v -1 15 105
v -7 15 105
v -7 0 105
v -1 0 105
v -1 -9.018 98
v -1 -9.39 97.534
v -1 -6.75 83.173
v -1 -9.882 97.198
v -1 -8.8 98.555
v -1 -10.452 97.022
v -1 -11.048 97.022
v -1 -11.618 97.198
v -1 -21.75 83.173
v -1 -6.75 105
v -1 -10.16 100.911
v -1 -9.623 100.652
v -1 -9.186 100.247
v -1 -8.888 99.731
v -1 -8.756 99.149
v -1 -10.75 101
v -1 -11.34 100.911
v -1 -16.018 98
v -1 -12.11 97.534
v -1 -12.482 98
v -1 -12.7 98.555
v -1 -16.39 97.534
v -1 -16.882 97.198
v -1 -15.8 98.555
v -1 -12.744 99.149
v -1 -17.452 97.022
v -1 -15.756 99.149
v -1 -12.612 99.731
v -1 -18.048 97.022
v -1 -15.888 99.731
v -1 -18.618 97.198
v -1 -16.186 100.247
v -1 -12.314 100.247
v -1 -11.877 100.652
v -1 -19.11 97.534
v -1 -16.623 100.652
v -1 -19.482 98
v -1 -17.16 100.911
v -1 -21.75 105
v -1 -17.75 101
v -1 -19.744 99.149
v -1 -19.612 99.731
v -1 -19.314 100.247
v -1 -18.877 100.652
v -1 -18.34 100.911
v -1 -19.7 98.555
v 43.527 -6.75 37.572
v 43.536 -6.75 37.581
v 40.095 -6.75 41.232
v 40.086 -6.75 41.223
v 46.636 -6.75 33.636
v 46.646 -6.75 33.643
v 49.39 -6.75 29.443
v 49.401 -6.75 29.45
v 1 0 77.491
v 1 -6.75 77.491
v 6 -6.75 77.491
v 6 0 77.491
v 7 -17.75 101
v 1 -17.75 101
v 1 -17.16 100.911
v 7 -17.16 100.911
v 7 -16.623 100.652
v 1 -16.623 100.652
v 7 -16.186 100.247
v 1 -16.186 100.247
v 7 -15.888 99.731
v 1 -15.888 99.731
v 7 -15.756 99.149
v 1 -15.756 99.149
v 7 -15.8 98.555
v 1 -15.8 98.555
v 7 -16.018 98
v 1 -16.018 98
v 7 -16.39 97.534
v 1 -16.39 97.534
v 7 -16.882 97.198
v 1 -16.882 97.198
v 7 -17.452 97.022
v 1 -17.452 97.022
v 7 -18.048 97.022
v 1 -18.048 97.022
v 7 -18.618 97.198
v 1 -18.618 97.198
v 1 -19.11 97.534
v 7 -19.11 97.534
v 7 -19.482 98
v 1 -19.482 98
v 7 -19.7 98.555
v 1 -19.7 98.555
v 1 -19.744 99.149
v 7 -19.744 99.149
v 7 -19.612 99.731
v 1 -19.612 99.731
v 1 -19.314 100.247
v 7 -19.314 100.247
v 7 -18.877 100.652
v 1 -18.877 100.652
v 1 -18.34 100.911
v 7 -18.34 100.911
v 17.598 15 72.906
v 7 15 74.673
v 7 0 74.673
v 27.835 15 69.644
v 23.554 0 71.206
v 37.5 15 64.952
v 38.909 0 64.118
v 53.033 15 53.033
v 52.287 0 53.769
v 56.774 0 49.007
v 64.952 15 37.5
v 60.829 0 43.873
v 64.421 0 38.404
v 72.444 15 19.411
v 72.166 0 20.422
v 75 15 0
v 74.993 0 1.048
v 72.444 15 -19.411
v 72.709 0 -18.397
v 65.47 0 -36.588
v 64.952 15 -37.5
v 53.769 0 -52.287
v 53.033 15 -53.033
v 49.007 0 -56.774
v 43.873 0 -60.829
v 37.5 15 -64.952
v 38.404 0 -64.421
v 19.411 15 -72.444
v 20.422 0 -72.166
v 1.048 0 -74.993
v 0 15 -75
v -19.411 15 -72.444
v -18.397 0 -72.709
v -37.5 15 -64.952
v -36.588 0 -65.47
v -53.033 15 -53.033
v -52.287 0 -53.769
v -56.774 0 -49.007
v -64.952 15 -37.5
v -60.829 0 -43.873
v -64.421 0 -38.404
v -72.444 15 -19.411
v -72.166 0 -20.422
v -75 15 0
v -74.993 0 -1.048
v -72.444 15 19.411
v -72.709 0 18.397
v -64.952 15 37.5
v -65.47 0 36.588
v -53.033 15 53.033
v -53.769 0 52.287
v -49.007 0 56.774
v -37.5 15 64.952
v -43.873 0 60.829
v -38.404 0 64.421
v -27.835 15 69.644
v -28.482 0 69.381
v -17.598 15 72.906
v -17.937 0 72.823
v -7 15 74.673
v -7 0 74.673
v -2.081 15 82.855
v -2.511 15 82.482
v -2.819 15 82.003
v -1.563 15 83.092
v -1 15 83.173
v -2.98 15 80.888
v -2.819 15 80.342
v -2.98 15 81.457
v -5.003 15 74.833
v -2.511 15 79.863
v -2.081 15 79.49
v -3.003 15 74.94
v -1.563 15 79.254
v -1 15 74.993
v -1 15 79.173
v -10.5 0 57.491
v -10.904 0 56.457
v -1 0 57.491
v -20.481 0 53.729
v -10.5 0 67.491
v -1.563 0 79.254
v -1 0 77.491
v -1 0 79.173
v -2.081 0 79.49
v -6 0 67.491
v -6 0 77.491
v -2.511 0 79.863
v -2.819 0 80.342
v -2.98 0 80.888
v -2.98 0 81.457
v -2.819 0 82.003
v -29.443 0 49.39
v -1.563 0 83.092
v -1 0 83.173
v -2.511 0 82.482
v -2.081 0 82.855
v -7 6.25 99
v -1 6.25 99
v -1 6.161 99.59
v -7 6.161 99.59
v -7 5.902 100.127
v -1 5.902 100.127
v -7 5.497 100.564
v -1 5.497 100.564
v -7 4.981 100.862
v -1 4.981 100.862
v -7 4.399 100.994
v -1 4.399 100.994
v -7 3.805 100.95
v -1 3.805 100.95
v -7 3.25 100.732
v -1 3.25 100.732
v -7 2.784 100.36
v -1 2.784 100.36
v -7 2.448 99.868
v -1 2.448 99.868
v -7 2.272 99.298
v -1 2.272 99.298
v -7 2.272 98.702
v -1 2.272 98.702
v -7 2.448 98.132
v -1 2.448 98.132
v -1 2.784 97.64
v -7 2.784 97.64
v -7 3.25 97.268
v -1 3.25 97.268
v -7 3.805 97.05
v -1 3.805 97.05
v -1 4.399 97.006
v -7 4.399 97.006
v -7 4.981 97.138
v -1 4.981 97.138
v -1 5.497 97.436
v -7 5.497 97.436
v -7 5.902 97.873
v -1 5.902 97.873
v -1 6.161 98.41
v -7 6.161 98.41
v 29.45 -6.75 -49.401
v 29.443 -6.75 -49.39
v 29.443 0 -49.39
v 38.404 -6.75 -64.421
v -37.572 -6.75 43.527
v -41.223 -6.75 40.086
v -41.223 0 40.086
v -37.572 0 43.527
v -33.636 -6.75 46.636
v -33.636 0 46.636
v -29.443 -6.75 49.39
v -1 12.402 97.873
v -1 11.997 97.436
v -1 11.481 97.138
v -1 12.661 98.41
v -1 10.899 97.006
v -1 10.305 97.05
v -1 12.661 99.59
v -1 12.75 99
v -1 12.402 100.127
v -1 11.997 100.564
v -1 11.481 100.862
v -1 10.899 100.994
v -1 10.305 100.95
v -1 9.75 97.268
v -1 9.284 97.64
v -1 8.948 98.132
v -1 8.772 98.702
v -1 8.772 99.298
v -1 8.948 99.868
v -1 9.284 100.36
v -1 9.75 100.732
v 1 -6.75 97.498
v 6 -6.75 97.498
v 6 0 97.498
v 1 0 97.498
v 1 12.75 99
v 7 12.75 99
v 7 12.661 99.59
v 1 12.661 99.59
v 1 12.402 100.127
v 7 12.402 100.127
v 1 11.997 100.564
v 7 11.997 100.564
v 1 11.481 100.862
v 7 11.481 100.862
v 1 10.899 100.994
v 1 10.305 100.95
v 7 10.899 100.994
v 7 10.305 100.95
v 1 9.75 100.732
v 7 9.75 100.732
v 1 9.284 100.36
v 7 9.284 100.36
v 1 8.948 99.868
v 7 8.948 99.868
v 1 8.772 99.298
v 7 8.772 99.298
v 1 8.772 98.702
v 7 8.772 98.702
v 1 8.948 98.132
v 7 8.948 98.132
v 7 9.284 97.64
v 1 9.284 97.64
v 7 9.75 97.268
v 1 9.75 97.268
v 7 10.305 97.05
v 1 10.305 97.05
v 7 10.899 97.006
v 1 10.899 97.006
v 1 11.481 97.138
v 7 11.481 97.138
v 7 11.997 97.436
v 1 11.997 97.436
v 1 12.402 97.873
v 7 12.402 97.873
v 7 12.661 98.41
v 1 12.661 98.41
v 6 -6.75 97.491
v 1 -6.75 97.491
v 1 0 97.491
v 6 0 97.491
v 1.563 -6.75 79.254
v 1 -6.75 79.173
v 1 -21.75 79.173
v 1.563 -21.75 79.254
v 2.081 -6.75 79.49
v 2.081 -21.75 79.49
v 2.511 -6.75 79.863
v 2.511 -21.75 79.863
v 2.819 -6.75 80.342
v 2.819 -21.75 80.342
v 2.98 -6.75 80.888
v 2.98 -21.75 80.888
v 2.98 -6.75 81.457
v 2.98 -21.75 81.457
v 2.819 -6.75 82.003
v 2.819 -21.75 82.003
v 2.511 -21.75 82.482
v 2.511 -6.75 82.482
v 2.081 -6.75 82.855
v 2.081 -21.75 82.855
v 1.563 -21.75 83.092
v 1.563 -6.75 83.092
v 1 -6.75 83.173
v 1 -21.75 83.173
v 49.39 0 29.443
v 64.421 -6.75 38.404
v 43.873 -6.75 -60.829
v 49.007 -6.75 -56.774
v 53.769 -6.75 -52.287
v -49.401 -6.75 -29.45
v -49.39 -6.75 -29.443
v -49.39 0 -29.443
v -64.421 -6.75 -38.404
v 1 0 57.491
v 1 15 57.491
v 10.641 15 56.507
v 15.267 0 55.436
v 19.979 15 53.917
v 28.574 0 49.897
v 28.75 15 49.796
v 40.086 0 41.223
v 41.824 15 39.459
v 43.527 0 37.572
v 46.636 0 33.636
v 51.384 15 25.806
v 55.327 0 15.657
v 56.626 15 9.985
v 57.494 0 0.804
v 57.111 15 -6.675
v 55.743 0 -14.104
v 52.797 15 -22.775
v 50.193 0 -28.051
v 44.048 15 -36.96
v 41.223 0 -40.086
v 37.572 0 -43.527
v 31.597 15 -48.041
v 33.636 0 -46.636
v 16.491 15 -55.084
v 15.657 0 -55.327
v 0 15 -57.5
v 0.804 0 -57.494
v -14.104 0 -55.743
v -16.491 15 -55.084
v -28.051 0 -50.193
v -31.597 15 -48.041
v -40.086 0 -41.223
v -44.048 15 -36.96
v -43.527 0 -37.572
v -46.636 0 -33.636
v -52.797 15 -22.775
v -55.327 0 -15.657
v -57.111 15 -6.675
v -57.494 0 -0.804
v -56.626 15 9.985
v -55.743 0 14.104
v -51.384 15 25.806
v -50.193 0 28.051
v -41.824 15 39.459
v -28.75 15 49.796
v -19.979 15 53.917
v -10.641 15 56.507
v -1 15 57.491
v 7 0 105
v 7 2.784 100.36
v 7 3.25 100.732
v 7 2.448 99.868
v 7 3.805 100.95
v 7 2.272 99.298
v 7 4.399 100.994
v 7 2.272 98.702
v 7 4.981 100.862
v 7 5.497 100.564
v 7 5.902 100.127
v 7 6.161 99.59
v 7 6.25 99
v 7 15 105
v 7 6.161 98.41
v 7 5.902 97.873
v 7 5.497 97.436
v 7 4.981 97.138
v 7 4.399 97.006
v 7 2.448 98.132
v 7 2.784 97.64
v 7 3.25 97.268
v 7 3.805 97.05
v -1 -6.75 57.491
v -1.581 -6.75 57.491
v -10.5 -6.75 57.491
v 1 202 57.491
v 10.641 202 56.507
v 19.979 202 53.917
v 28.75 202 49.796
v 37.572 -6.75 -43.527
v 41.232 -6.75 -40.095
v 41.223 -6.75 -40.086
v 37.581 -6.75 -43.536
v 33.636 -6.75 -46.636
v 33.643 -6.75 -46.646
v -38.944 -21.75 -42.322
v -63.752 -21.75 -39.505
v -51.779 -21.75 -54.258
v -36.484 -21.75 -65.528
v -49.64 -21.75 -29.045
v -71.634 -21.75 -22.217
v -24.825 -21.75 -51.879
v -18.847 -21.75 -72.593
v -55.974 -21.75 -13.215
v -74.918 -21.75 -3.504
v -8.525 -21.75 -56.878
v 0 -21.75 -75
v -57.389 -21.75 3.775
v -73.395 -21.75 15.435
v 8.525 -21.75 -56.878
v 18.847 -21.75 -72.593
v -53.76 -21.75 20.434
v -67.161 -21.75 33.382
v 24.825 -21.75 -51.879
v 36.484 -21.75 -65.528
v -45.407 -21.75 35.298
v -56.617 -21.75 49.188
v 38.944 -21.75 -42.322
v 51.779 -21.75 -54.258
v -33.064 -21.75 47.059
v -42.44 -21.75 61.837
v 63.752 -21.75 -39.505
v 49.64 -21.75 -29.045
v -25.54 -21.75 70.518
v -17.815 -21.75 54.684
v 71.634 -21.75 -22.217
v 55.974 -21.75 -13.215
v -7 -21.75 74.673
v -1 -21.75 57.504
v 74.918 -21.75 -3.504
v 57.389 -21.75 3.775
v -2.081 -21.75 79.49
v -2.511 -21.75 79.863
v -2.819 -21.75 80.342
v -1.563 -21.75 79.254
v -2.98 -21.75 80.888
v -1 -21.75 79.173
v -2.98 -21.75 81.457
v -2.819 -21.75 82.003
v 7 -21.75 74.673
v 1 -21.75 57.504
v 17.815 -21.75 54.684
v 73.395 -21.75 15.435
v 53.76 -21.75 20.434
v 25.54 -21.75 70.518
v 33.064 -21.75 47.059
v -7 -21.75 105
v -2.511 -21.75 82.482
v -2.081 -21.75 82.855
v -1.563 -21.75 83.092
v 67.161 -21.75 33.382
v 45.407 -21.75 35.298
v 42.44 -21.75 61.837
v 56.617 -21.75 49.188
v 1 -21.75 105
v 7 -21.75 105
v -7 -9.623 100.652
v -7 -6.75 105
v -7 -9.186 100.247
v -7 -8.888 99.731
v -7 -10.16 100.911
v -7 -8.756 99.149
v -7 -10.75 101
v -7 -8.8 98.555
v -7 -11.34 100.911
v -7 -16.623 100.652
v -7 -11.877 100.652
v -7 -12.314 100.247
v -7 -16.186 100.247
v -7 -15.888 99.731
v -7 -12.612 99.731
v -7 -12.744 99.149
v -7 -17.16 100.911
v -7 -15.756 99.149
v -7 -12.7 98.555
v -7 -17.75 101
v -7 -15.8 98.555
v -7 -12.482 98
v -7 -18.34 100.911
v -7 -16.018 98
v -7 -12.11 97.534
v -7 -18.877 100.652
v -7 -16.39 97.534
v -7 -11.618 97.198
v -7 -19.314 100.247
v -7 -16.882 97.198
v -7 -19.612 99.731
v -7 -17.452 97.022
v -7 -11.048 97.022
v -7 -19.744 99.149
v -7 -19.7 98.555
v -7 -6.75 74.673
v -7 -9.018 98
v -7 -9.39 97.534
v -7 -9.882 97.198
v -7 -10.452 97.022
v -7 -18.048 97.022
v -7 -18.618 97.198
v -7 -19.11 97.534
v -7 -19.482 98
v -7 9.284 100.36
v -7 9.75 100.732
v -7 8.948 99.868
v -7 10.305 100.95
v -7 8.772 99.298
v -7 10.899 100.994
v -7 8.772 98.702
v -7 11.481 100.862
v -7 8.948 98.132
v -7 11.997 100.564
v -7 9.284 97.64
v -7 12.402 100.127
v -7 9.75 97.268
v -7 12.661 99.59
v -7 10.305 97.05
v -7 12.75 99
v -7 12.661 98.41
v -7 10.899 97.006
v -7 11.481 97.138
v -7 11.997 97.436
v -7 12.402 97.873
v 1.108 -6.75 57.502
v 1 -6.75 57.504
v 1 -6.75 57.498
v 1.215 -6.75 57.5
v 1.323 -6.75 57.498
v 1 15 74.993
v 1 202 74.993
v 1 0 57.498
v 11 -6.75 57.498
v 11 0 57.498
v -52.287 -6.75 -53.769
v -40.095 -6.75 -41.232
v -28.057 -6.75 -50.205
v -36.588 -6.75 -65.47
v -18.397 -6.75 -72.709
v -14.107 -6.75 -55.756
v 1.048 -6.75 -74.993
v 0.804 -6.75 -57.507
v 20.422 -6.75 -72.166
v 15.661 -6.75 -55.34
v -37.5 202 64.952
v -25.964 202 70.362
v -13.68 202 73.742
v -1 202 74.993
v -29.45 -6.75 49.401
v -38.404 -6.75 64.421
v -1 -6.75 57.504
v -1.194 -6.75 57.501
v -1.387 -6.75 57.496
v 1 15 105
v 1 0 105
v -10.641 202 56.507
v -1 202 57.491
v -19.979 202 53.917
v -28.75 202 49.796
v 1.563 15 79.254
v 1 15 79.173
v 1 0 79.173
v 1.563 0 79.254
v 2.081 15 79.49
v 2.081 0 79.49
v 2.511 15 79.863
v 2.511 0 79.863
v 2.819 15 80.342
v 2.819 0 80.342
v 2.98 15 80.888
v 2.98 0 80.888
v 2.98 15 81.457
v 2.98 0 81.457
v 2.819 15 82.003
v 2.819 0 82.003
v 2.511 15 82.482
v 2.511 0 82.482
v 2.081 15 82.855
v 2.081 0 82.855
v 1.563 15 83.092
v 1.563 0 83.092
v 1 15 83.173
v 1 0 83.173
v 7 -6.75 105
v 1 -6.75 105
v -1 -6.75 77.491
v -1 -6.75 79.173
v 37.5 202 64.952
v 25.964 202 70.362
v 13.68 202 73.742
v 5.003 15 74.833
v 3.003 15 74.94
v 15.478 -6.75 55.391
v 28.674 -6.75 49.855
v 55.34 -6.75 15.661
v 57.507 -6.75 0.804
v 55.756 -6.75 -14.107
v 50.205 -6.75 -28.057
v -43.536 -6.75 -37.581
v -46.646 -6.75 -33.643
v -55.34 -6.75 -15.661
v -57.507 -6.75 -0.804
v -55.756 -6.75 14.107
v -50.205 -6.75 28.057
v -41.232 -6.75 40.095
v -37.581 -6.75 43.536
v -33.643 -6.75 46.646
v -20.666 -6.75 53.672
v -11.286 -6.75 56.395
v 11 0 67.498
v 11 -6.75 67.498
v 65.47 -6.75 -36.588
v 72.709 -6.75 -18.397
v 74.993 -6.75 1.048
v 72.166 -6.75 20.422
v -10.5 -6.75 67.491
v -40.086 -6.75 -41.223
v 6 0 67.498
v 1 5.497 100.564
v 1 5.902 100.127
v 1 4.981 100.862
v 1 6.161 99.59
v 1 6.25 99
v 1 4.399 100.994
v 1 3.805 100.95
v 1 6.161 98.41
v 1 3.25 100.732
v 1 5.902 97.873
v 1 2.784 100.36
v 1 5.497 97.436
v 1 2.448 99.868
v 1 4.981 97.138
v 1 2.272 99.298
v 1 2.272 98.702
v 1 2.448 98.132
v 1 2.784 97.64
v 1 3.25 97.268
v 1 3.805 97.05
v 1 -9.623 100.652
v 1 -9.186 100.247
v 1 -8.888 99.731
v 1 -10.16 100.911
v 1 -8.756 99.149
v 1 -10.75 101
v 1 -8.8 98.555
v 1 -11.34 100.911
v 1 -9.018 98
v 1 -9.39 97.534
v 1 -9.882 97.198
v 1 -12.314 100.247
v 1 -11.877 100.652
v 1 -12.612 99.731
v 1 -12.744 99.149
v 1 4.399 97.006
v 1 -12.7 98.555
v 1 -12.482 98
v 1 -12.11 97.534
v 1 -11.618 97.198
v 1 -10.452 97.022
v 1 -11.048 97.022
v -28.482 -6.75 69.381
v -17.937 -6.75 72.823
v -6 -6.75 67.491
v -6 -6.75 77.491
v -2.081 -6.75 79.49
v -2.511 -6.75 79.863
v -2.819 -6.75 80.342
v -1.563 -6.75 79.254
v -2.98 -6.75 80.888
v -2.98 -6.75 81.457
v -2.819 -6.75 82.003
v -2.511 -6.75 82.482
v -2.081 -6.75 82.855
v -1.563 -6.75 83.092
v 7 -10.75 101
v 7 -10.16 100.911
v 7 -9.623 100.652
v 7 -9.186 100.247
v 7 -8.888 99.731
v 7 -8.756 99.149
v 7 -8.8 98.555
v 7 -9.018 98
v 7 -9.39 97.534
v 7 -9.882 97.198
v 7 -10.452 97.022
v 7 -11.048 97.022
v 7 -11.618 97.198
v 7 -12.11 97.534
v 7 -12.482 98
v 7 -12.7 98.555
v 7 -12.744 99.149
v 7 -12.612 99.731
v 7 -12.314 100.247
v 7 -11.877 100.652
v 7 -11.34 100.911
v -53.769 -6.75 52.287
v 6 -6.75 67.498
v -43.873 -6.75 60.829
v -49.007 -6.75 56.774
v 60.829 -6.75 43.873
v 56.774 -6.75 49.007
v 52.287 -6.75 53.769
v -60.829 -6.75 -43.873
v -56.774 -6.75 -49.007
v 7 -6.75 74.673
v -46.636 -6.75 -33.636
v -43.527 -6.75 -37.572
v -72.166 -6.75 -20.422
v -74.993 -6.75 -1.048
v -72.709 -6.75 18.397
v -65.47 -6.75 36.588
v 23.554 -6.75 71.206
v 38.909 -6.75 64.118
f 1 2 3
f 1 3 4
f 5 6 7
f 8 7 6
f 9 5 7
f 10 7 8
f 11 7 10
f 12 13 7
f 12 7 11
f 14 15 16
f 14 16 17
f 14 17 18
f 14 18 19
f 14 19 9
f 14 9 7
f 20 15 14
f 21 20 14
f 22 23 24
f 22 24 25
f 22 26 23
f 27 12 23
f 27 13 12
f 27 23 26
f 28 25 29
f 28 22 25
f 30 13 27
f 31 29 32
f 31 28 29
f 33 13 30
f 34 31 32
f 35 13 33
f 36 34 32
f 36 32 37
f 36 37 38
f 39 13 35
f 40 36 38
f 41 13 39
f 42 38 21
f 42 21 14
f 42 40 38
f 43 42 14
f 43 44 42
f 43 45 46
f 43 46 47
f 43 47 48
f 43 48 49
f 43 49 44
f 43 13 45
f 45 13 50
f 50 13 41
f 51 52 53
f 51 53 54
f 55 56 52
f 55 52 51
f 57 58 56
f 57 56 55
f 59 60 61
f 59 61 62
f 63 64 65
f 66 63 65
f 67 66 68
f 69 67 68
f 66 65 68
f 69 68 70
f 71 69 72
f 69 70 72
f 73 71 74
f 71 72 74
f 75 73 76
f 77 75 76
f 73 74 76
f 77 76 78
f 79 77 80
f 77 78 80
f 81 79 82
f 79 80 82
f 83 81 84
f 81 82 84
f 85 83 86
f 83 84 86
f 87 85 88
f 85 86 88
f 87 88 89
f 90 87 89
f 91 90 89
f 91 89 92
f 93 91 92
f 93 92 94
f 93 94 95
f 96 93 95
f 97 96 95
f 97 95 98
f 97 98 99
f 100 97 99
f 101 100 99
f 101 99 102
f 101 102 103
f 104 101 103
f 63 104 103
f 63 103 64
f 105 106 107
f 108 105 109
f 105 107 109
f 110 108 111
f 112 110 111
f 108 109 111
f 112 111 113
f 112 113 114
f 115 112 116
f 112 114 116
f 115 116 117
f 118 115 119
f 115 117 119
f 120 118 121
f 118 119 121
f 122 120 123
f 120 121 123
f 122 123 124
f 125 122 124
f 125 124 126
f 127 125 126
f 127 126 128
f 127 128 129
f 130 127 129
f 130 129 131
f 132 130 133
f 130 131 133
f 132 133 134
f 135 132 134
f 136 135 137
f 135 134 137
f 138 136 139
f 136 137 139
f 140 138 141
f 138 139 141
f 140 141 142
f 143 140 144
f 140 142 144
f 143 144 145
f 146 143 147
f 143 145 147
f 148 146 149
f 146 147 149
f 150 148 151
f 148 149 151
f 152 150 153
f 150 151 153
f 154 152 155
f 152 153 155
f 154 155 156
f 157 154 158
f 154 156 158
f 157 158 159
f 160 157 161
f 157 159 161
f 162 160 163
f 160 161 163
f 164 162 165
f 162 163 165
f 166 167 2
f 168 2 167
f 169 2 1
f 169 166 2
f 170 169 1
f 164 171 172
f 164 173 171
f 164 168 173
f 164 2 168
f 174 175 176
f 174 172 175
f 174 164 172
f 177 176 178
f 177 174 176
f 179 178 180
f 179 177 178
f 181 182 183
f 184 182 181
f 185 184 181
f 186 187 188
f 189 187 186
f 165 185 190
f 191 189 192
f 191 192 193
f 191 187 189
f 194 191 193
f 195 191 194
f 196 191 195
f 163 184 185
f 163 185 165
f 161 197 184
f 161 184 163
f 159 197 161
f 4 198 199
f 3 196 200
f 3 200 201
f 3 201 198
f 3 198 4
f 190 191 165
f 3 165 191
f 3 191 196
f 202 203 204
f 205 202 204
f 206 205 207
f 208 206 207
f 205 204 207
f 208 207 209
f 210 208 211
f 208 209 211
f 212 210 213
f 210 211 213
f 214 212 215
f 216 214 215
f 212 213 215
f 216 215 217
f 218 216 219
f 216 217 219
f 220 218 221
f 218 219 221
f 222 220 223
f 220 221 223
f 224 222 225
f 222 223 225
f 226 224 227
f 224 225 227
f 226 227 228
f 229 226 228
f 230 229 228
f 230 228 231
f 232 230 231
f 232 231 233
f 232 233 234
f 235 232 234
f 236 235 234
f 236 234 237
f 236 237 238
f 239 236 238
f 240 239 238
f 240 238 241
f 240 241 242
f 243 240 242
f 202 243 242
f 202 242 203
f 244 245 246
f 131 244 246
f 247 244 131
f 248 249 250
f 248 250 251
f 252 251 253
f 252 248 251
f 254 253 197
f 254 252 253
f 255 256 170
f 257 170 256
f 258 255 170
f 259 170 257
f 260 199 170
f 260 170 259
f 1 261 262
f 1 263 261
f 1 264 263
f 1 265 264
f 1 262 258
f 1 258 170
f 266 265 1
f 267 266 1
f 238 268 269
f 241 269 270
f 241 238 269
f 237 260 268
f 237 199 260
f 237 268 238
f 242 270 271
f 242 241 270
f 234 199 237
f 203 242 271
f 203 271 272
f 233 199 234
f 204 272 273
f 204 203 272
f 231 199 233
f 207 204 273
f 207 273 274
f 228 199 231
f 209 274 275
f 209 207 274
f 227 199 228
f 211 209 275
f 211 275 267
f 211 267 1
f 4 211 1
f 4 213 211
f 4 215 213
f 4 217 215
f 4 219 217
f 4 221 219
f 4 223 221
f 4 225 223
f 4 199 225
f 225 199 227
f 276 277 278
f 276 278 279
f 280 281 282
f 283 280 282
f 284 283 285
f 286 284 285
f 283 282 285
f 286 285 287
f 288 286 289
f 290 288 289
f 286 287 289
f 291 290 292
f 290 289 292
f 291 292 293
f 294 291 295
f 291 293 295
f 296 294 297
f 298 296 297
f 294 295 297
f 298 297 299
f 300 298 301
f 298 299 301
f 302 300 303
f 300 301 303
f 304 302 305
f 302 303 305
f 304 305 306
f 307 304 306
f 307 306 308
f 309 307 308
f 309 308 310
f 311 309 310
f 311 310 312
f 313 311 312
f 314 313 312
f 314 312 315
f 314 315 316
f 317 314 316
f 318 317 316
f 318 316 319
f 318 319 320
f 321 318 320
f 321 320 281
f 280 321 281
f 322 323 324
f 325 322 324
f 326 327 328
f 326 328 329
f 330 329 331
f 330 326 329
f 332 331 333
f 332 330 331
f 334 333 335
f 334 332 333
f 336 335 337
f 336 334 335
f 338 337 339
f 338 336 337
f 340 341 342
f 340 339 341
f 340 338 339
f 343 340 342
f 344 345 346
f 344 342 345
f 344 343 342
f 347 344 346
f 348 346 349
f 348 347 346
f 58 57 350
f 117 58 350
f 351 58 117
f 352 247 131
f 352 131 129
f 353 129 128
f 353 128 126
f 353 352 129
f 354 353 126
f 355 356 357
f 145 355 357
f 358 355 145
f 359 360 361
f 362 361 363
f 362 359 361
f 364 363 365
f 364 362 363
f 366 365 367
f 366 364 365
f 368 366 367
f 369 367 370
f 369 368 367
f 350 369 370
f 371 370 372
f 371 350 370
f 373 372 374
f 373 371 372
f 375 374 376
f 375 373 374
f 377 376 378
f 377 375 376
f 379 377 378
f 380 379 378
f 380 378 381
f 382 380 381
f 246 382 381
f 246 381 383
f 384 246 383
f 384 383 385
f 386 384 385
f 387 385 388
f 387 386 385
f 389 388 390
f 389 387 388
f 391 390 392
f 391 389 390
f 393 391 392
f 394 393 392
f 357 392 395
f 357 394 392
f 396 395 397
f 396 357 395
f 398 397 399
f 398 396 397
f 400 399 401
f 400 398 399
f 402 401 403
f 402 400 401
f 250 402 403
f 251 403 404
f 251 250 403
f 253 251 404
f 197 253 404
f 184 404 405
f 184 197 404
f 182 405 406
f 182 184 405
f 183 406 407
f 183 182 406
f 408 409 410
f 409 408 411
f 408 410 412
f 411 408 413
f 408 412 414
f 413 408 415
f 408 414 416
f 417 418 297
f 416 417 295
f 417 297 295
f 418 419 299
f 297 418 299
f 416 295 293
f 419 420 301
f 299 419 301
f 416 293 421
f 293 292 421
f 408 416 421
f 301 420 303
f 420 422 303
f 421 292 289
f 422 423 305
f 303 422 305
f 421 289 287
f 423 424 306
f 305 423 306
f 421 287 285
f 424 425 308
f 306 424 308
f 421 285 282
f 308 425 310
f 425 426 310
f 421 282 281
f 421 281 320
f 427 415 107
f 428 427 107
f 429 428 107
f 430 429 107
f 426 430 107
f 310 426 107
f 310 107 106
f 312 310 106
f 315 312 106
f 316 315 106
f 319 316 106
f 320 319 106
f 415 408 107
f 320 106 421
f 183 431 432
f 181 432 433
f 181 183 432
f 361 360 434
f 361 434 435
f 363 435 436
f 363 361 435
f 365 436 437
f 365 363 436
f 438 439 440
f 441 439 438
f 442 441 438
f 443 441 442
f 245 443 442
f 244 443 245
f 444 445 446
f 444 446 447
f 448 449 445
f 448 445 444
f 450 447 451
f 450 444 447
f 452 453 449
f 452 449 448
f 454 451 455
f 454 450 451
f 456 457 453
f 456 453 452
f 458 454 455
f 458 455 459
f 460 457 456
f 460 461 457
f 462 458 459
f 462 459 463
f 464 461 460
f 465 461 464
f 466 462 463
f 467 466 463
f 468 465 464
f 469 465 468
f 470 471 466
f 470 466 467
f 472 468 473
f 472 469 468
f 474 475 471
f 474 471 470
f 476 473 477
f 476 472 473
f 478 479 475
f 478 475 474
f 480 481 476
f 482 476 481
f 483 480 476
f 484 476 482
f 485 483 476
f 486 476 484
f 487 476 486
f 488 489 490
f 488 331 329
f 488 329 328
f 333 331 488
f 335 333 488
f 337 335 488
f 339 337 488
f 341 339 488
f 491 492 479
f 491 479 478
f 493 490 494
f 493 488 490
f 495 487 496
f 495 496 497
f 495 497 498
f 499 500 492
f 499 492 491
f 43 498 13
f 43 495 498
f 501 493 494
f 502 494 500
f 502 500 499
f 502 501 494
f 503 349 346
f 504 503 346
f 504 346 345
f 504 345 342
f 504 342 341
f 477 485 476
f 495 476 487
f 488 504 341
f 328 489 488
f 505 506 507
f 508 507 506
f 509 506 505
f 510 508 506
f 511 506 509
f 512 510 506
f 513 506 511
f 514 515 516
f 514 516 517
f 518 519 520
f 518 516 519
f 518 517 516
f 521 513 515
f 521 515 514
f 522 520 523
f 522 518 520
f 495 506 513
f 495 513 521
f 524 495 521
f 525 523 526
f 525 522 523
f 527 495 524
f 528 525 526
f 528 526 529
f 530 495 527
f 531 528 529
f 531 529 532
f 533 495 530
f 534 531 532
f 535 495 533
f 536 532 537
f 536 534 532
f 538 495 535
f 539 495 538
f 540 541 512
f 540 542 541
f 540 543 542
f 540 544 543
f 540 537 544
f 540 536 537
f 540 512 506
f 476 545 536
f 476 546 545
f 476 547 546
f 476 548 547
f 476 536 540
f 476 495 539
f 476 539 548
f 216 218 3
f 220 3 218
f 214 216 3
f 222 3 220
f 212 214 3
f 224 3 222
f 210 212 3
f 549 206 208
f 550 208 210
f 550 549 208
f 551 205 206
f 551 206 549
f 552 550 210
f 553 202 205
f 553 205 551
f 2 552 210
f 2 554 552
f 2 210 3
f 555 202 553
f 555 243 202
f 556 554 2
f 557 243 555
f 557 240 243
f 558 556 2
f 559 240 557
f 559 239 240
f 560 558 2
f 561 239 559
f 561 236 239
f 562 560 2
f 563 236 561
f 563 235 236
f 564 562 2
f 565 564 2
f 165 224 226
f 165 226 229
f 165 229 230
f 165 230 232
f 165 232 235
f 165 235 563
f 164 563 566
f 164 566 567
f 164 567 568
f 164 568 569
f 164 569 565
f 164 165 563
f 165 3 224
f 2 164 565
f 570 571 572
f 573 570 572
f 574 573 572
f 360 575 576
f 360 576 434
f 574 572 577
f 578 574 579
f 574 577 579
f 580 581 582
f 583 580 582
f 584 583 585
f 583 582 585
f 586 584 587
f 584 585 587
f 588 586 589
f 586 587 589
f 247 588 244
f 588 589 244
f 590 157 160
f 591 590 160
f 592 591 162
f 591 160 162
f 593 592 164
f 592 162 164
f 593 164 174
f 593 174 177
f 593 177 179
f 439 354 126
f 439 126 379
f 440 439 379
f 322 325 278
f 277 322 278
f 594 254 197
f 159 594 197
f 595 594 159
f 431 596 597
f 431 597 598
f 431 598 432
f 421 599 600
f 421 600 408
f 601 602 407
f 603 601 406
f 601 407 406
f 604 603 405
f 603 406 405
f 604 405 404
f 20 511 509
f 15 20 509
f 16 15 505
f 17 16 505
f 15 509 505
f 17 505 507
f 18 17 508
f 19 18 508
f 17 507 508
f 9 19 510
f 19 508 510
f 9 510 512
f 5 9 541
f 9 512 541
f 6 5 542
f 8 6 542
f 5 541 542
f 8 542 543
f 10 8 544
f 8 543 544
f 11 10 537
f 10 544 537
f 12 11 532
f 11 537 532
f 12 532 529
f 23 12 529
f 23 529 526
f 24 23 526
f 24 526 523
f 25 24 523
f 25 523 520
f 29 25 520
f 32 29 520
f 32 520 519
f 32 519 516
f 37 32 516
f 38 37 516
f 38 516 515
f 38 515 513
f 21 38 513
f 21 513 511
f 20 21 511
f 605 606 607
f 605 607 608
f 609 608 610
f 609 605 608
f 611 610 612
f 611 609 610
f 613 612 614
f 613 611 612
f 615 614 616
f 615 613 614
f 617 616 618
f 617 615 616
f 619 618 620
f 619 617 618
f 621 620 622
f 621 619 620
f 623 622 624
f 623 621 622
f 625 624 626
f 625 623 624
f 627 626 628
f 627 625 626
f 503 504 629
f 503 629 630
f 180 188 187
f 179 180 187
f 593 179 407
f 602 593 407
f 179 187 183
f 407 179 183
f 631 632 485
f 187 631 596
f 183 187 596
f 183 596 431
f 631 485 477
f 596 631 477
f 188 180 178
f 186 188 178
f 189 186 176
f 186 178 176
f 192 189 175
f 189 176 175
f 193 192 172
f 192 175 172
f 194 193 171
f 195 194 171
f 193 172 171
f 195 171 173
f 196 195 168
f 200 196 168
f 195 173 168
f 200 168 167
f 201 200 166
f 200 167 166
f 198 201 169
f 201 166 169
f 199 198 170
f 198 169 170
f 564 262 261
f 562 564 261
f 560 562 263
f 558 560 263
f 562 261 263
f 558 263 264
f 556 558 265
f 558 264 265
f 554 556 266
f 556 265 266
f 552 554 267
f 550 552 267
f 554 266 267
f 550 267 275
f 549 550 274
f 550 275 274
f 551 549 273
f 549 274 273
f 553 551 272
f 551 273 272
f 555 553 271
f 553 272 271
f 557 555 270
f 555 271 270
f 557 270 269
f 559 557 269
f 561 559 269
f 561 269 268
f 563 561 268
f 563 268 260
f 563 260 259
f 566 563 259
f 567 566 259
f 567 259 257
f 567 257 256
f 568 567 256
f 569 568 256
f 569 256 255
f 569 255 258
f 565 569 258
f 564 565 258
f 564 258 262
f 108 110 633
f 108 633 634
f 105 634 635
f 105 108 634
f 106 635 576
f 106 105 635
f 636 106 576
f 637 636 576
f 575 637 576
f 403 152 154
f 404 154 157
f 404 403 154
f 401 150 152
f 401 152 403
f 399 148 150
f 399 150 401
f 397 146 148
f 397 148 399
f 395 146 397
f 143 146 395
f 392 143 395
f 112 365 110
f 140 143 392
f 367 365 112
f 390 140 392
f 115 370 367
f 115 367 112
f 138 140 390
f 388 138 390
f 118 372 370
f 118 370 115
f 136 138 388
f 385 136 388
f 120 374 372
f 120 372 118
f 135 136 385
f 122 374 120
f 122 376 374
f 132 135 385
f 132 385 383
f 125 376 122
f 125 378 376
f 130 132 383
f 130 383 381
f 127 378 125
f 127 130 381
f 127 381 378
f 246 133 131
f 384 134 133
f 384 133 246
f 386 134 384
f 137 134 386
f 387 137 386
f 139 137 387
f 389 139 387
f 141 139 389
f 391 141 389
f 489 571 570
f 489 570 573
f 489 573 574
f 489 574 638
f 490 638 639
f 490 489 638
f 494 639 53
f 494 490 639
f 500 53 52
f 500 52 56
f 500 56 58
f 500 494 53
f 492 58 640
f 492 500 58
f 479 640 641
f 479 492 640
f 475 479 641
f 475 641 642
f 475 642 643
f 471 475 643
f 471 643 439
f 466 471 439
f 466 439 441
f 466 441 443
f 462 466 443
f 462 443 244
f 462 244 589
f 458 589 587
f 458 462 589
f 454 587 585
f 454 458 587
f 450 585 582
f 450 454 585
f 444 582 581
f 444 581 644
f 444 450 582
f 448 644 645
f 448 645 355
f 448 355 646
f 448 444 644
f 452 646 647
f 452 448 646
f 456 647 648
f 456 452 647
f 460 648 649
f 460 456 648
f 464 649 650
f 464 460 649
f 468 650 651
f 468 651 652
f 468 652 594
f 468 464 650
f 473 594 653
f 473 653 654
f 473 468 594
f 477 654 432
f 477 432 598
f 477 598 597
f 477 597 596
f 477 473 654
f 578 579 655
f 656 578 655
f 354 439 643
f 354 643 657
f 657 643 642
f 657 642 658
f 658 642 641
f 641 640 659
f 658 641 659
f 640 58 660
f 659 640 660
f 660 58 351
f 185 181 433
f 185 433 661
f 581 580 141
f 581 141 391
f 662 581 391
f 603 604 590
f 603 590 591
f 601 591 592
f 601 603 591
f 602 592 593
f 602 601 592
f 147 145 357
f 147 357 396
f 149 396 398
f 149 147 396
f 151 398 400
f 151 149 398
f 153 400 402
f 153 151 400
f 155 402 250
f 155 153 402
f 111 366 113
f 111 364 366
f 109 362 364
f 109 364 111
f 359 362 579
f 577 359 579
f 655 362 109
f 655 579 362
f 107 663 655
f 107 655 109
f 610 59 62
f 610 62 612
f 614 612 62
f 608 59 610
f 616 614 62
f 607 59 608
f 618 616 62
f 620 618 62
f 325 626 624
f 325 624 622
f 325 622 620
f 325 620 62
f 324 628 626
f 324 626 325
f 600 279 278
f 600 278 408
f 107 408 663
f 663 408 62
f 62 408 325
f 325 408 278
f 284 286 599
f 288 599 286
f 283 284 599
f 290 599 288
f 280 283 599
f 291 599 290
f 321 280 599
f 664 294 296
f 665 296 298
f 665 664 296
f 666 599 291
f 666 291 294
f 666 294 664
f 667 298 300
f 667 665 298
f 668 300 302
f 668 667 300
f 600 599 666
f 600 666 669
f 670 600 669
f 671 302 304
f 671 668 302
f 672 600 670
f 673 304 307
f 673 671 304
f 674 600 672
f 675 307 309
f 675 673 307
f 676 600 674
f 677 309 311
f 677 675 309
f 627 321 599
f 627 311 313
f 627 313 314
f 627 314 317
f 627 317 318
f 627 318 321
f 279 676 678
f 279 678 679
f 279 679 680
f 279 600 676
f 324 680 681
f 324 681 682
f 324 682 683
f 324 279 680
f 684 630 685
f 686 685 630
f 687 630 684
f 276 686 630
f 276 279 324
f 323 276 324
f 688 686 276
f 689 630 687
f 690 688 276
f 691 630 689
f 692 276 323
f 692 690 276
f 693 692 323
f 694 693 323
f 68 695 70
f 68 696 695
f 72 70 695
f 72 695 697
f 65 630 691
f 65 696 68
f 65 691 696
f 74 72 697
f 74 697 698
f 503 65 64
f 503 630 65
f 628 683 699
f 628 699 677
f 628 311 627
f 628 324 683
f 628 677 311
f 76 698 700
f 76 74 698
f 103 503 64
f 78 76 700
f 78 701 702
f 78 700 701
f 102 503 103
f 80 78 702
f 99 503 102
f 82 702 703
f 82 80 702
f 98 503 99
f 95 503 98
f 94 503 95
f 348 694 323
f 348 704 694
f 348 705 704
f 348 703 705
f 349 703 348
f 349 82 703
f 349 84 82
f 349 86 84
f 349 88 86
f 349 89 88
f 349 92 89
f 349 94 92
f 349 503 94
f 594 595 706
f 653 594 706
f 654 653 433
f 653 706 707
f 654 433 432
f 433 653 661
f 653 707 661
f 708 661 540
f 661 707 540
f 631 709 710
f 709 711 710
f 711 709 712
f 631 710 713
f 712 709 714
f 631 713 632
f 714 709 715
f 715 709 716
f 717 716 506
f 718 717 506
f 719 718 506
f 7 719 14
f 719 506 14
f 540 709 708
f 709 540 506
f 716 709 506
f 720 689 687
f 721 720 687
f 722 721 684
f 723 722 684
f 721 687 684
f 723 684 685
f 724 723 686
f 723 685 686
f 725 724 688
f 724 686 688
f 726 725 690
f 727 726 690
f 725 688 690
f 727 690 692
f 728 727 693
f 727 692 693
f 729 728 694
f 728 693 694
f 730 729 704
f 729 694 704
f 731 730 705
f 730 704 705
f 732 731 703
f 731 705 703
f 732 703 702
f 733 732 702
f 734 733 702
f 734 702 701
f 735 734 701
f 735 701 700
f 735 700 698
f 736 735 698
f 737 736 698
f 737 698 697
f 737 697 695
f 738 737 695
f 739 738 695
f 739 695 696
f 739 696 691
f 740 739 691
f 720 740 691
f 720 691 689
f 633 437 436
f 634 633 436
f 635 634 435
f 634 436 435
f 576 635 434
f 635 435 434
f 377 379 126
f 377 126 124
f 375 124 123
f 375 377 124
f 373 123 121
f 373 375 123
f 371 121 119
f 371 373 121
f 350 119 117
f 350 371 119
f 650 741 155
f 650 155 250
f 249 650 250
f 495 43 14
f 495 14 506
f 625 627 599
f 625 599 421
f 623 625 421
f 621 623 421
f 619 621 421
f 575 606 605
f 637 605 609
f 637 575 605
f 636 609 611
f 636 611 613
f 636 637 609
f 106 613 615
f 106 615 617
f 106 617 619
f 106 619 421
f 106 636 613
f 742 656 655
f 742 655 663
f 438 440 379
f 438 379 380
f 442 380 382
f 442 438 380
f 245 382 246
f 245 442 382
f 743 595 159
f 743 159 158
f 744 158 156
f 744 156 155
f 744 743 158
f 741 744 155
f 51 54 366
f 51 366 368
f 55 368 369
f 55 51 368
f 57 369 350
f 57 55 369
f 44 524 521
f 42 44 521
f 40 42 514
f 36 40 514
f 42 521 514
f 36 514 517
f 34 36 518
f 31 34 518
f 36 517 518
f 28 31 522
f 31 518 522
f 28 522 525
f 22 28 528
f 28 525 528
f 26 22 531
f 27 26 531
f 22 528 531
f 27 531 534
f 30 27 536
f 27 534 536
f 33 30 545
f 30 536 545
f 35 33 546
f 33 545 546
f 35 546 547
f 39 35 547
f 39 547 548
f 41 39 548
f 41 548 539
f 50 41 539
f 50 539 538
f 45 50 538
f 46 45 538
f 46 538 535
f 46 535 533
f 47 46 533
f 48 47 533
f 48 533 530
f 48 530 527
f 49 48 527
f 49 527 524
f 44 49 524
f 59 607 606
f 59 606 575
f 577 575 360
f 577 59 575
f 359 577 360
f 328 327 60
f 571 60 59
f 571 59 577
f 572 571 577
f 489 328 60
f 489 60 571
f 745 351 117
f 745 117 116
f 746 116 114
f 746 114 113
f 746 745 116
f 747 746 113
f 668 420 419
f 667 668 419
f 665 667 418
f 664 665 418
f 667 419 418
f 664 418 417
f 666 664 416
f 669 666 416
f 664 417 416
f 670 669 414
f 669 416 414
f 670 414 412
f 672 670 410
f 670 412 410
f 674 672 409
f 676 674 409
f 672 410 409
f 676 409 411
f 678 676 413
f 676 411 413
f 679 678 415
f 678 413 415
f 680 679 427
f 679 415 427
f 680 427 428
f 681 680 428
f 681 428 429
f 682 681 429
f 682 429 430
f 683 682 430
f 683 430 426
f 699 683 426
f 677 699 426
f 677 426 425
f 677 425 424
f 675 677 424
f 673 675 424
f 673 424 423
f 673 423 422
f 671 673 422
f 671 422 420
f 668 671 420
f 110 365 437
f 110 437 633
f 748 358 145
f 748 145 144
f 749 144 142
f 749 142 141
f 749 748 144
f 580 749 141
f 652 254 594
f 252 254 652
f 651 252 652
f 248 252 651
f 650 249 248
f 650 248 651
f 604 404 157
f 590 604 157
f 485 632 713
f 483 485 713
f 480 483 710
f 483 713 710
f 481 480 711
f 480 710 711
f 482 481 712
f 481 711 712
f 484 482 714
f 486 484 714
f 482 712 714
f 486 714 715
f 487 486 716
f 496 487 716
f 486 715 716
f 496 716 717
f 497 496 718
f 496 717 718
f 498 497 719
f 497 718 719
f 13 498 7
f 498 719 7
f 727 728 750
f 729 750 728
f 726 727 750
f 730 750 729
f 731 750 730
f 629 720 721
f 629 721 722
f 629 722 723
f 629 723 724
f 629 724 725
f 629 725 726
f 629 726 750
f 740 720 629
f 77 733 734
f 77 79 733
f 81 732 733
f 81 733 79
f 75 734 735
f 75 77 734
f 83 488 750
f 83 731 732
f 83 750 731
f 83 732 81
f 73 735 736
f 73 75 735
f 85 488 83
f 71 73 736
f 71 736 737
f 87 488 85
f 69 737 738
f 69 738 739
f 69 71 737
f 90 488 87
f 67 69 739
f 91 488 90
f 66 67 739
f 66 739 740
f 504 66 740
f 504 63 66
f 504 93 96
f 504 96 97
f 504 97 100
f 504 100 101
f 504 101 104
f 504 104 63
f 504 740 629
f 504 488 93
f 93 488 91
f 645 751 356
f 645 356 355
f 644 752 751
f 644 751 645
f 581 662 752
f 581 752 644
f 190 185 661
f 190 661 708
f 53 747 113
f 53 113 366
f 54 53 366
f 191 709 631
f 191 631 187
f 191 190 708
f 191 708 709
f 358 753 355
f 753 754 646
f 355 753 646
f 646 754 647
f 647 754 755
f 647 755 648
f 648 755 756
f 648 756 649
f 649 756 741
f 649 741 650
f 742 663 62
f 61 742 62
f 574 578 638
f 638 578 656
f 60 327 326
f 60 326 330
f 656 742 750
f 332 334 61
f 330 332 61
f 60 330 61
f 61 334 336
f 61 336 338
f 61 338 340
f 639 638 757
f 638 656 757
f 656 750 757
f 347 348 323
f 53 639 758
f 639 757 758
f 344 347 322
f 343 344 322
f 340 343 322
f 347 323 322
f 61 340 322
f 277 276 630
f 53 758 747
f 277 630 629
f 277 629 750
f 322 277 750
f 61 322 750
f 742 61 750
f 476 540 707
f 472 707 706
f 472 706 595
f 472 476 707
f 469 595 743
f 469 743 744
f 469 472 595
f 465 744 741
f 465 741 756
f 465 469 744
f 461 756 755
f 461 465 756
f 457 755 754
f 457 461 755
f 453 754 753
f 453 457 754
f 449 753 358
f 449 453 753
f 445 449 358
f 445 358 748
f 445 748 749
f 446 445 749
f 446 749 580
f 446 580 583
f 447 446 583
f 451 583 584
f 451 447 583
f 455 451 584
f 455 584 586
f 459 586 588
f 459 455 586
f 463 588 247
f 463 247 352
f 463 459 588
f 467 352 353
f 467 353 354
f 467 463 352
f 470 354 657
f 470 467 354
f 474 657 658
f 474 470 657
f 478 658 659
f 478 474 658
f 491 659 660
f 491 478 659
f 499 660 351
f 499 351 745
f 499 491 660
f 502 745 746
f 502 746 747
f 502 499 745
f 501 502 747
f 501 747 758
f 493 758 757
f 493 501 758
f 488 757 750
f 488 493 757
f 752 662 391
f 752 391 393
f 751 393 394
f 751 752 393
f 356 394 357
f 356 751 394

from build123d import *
from build123d.topology import SkipClean

# Parameters (mm, degrees)
SKETCH1_R                = 75
SKETCH1_R_2              = 57.5
BOSS_EXTRUDE1_DEPTH      = 15
BOSS_EXTRUDE2_DEPTH      = 30
BOSS_EXTRUDE2_DEPTH_BACK = 5
SKETCH2_W                = 14
SKETCH2_H                = 15
SKETCH5_W                = 2
SKETCH5_H                = 47.50869631
CUT_EXTRUDE2_DEPTH       = 64
SKETCH6_R                = 2
CUT_EXTRUDE3_DEPTH       = 64
BOSS_EXTRUDE3_DEPTH      = 6.75
BOSS_EXTRUDE4_START      = 15
BOSS_EXTRUDE4_DEPTH      = 15
SKETCH10_R               = 2
CUT_EXTRUDE5_DEPTH       = 135.989119932
SKETCH11_W               = 20
SKETCH11_H               = 6.75
CUT_EXTRUDE6_DEPTH       = 135.384011326
BOSS_EXTRUDE5_DEPTH      = 6.75
CUT_EXTRUDE8_DEPTH       = 135.166174947
BOSS_EXTRUDE6_DEPTH      = 187


with BuildPart() as part:
    # Sketch1 → Boss-Extrude1 (new body)
    with BuildSketch(Plane(origin=(0, 0, 0), x_dir=(1, 0, 0), z_dir=(0, 1, 0))):
        with Locations(Location((0, 0, 0), (0, 0, 270))):
            Circle(SKETCH1_R)
        with Locations(Location((0, 0, 0), (0, 0, 270))):
            Circle(SKETCH1_R_2, mode=Mode.SUBTRACT)
    extrude(amount=BOSS_EXTRUDE1_DEPTH)

    # Sketch2 → Boss-Extrude2 (add, two sides: drawn at the far end of the back side and taken through both)
    with BuildSketch(Plane.XY.offset(75).offset(-BOSS_EXTRUDE2_DEPTH_BACK)):
        with Locations((0, 7.5)):
            Rectangle(SKETCH2_W, SKETCH2_H)
    extrude(amount=BOSS_EXTRUDE2_DEPTH + BOSS_EXTRUDE2_DEPTH_BACK)

    # Sketch5 → Cut-Extrude2 (cut)
    with BuildSketch(Plane.XZ):
        with Locations((0, 81.245651845)):
            Rectangle(SKETCH5_W, SKETCH5_H)
    extrude(amount=-CUT_EXTRUDE2_DEPTH, mode=Mode.SUBTRACT)

    # Sketch6 → Cut-Extrude3 (cut)
    with BuildSketch(Plane(origin=(7, 0, 0), x_dir=(0, 0, -1), z_dir=(1, 0, 0))):
        with Locations(Location((-99, 4.25, 0), (0, 0, 90))):
            Circle(SKETCH6_R)
        with Locations(Location((-99, 10.75, 0), (0, 0, 90))):
            Circle(SKETCH6_R)
    extrude(amount=-CUT_EXTRUDE3_DEPTH, mode=Mode.SUBTRACT)

    # Sketch7 → Boss-Extrude3 (add)
    with BuildSketch(Plane.XZ):
        Polygon((1, 67.497826046), (1, 57.497826046), (11, 57.497826046), (11, 67.497826046), (6, 67.497826046), (6, 97.497826046), (1, 97.497826046), align=None)
        Polygon((-6, 67.49130369), (-6, 97.49130369), (-1, 97.49130369), (-1, 57.49130369), (-10.5, 57.49130369), (-10.5, 67.49130369), align=None)
    extrude(amount=BOSS_EXTRUDE3_DEPTH)

    # Sketch8 → Boss-Extrude4 (add)
    with BuildSketch(Plane.XZ.offset(6.75).offset(BOSS_EXTRUDE4_START)):
        with BuildLine():
            Line((-1, 57.50434569), (-1, 105))
            Line((-1, 105), (-7, 105))
            Line((-7, 105), (-7, 74.67261881))
            ThreePointArc((-7, 74.67261881), (0, -75), (7, 74.67261881))
            Line((7, 74.67261881), (7, 105))
            Line((7, 105), (1, 105))
            Line((1, 105), (1, 57.50434569))
            ThreePointArc((1, 57.50434569), (0, -57.513040028), (-1, 57.50434569))
        make_face()
    extrude(amount=-BOSS_EXTRUDE4_DEPTH)

    # Sketch10 → Cut-Extrude5 (cut, through all)
    with BuildSketch(Plane.ZY.offset(7)):
        with Locations((99, -10.75)):
            Circle(SKETCH10_R)
        with Locations((99, -17.75)):
            Circle(SKETCH10_R)
    extrude(amount=-CUT_EXTRUDE5_DEPTH, mode=Mode.SUBTRACT)

    # Sketch11 → Cut-Extrude6 (cut, through all)
    with BuildSketch(Plane.ZY.offset(6)):
        with Locations((87.49130369, -3.375)):
            Rectangle(SKETCH11_W, SKETCH11_H)
    extrude(amount=-CUT_EXTRUDE6_DEPTH, mode=Mode.SUBTRACT)

    # Sketch12 → Boss-Extrude5 (add)
    with SkipClean():  # the faces are left unmerged after this step: merging them gives an invalid solid
        with BuildSketch(Plane(origin=(0, -6.75, 0), x_dir=(1, 0, 0), z_dir=(0, 1, 0))):
            with BuildLine():
                Line((52.286531011, -53.769123806), (40.086340442, -41.222994918))
                ThreePointArc((40.086340442, -41.222994918), (45.124076801, -35.638009104), (49.389727695, -29.443247073))
                Line((49.389727695, -29.443247073), (64.42138395, -38.404235313))
                ThreePointArc((64.42138395, -38.404235313), (58.857491479, -46.484359701), (52.286531011, -53.769123806))
            make_face()
            with BuildLine():
                Line((-53.769123806, -52.286531011), (-41.222994918, -40.086340442))
                ThreePointArc((-41.222994918, -40.086340442), (-35.638009104, -45.124076801), (-29.443247073, -49.389727695))
                Line((-29.443247073, -49.389727695), (-38.404235313, -64.42138395))
                ThreePointArc((-38.404235313, -64.42138395), (-46.484359701, -58.857491479), (-53.769123806, -52.286531011))
            make_face()
            with BuildLine():
                Line((-52.286531011, 53.769123806), (-40.086340442, 41.222994918))
                ThreePointArc((-40.086340442, 41.222994918), (-45.124076801, 35.638009104), (-49.389727695, 29.443247073))
                Line((-49.389727695, 29.443247073), (-64.42138395, 38.404235313))
                ThreePointArc((-64.42138395, 38.404235313), (-58.857491479, 46.484359701), (-52.286531011, 53.769123806))
            make_face()
            with BuildLine():
                Line((53.769123806, 52.286531011), (41.222994918, 40.086340442))
                ThreePointArc((41.222994918, 40.086340442), (35.638009104, 45.124076801), (29.443247073, 49.389727695))
                Line((29.443247073, 49.389727695), (38.404235313, 64.42138395))
                ThreePointArc((38.404235313, 64.42138395), (46.484359701, 58.857491479), (53.769123806, 52.286531011))
            make_face()
        extrude(amount=BOSS_EXTRUDE5_DEPTH)

    # Sketch15 → Cut-Extrude8 (cut, through all)
    with SkipClean():  # the faces are left unmerged after this step: merging them gives an invalid solid
        with BuildSketch(Plane(origin=(0, 15, 0), x_dir=(1, 0, 0), z_dir=(0, 1, 0))):
            with BuildLine():
                Line((-1, -83.17261881), (-1, -79.17261881))
                ThreePointArc((-1, -79.17261881), (-3, -81.17261881), (-1, -83.17261881))
            make_face()
            with BuildLine():
                Line((1, -83.17261881), (1, -79.17261881))
                ThreePointArc((1, -79.17261881), (3, -81.17261881), (1, -83.17261881))
            make_face()
        extrude(amount=-CUT_EXTRUDE8_DEPTH, mode=Mode.SUBTRACT)

    # Sketch16 → Boss-Extrude6 (add)
    with BuildSketch(Plane(origin=(0, 15, 0), x_dir=(1, 0, 0), z_dir=(0, 1, 0))):
        with BuildLine():
            Line((-1, -74.993333037), (-1, -57.49130369))
            ThreePointArc((-1, -57.49130369), (-15.364513565, -55.409220559), (-28.75, -49.796460718))
            Line((-28.75, -49.796460718), (-37.5, -64.951905284))
            ThreePointArc((-37.5, -64.951905284), (-19.89397064, -72.313414607), (-1, -74.993333037))
        make_face()
        with BuildLine():
            Line((1, -74.993333037), (1, -57.49130369))
            ThreePointArc((1, -57.49130369), (15.364513565, -55.409220559), (28.75, -49.796460718))
            Line((28.75, -49.796460718), (37.5, -64.951905284))
            ThreePointArc((37.5, -64.951905284), (19.89397064, -72.313414607), (1, -74.993333037))
        make_face()
    extrude(amount=BOSS_EXTRUDE6_DEPTH)


solid = part.part
